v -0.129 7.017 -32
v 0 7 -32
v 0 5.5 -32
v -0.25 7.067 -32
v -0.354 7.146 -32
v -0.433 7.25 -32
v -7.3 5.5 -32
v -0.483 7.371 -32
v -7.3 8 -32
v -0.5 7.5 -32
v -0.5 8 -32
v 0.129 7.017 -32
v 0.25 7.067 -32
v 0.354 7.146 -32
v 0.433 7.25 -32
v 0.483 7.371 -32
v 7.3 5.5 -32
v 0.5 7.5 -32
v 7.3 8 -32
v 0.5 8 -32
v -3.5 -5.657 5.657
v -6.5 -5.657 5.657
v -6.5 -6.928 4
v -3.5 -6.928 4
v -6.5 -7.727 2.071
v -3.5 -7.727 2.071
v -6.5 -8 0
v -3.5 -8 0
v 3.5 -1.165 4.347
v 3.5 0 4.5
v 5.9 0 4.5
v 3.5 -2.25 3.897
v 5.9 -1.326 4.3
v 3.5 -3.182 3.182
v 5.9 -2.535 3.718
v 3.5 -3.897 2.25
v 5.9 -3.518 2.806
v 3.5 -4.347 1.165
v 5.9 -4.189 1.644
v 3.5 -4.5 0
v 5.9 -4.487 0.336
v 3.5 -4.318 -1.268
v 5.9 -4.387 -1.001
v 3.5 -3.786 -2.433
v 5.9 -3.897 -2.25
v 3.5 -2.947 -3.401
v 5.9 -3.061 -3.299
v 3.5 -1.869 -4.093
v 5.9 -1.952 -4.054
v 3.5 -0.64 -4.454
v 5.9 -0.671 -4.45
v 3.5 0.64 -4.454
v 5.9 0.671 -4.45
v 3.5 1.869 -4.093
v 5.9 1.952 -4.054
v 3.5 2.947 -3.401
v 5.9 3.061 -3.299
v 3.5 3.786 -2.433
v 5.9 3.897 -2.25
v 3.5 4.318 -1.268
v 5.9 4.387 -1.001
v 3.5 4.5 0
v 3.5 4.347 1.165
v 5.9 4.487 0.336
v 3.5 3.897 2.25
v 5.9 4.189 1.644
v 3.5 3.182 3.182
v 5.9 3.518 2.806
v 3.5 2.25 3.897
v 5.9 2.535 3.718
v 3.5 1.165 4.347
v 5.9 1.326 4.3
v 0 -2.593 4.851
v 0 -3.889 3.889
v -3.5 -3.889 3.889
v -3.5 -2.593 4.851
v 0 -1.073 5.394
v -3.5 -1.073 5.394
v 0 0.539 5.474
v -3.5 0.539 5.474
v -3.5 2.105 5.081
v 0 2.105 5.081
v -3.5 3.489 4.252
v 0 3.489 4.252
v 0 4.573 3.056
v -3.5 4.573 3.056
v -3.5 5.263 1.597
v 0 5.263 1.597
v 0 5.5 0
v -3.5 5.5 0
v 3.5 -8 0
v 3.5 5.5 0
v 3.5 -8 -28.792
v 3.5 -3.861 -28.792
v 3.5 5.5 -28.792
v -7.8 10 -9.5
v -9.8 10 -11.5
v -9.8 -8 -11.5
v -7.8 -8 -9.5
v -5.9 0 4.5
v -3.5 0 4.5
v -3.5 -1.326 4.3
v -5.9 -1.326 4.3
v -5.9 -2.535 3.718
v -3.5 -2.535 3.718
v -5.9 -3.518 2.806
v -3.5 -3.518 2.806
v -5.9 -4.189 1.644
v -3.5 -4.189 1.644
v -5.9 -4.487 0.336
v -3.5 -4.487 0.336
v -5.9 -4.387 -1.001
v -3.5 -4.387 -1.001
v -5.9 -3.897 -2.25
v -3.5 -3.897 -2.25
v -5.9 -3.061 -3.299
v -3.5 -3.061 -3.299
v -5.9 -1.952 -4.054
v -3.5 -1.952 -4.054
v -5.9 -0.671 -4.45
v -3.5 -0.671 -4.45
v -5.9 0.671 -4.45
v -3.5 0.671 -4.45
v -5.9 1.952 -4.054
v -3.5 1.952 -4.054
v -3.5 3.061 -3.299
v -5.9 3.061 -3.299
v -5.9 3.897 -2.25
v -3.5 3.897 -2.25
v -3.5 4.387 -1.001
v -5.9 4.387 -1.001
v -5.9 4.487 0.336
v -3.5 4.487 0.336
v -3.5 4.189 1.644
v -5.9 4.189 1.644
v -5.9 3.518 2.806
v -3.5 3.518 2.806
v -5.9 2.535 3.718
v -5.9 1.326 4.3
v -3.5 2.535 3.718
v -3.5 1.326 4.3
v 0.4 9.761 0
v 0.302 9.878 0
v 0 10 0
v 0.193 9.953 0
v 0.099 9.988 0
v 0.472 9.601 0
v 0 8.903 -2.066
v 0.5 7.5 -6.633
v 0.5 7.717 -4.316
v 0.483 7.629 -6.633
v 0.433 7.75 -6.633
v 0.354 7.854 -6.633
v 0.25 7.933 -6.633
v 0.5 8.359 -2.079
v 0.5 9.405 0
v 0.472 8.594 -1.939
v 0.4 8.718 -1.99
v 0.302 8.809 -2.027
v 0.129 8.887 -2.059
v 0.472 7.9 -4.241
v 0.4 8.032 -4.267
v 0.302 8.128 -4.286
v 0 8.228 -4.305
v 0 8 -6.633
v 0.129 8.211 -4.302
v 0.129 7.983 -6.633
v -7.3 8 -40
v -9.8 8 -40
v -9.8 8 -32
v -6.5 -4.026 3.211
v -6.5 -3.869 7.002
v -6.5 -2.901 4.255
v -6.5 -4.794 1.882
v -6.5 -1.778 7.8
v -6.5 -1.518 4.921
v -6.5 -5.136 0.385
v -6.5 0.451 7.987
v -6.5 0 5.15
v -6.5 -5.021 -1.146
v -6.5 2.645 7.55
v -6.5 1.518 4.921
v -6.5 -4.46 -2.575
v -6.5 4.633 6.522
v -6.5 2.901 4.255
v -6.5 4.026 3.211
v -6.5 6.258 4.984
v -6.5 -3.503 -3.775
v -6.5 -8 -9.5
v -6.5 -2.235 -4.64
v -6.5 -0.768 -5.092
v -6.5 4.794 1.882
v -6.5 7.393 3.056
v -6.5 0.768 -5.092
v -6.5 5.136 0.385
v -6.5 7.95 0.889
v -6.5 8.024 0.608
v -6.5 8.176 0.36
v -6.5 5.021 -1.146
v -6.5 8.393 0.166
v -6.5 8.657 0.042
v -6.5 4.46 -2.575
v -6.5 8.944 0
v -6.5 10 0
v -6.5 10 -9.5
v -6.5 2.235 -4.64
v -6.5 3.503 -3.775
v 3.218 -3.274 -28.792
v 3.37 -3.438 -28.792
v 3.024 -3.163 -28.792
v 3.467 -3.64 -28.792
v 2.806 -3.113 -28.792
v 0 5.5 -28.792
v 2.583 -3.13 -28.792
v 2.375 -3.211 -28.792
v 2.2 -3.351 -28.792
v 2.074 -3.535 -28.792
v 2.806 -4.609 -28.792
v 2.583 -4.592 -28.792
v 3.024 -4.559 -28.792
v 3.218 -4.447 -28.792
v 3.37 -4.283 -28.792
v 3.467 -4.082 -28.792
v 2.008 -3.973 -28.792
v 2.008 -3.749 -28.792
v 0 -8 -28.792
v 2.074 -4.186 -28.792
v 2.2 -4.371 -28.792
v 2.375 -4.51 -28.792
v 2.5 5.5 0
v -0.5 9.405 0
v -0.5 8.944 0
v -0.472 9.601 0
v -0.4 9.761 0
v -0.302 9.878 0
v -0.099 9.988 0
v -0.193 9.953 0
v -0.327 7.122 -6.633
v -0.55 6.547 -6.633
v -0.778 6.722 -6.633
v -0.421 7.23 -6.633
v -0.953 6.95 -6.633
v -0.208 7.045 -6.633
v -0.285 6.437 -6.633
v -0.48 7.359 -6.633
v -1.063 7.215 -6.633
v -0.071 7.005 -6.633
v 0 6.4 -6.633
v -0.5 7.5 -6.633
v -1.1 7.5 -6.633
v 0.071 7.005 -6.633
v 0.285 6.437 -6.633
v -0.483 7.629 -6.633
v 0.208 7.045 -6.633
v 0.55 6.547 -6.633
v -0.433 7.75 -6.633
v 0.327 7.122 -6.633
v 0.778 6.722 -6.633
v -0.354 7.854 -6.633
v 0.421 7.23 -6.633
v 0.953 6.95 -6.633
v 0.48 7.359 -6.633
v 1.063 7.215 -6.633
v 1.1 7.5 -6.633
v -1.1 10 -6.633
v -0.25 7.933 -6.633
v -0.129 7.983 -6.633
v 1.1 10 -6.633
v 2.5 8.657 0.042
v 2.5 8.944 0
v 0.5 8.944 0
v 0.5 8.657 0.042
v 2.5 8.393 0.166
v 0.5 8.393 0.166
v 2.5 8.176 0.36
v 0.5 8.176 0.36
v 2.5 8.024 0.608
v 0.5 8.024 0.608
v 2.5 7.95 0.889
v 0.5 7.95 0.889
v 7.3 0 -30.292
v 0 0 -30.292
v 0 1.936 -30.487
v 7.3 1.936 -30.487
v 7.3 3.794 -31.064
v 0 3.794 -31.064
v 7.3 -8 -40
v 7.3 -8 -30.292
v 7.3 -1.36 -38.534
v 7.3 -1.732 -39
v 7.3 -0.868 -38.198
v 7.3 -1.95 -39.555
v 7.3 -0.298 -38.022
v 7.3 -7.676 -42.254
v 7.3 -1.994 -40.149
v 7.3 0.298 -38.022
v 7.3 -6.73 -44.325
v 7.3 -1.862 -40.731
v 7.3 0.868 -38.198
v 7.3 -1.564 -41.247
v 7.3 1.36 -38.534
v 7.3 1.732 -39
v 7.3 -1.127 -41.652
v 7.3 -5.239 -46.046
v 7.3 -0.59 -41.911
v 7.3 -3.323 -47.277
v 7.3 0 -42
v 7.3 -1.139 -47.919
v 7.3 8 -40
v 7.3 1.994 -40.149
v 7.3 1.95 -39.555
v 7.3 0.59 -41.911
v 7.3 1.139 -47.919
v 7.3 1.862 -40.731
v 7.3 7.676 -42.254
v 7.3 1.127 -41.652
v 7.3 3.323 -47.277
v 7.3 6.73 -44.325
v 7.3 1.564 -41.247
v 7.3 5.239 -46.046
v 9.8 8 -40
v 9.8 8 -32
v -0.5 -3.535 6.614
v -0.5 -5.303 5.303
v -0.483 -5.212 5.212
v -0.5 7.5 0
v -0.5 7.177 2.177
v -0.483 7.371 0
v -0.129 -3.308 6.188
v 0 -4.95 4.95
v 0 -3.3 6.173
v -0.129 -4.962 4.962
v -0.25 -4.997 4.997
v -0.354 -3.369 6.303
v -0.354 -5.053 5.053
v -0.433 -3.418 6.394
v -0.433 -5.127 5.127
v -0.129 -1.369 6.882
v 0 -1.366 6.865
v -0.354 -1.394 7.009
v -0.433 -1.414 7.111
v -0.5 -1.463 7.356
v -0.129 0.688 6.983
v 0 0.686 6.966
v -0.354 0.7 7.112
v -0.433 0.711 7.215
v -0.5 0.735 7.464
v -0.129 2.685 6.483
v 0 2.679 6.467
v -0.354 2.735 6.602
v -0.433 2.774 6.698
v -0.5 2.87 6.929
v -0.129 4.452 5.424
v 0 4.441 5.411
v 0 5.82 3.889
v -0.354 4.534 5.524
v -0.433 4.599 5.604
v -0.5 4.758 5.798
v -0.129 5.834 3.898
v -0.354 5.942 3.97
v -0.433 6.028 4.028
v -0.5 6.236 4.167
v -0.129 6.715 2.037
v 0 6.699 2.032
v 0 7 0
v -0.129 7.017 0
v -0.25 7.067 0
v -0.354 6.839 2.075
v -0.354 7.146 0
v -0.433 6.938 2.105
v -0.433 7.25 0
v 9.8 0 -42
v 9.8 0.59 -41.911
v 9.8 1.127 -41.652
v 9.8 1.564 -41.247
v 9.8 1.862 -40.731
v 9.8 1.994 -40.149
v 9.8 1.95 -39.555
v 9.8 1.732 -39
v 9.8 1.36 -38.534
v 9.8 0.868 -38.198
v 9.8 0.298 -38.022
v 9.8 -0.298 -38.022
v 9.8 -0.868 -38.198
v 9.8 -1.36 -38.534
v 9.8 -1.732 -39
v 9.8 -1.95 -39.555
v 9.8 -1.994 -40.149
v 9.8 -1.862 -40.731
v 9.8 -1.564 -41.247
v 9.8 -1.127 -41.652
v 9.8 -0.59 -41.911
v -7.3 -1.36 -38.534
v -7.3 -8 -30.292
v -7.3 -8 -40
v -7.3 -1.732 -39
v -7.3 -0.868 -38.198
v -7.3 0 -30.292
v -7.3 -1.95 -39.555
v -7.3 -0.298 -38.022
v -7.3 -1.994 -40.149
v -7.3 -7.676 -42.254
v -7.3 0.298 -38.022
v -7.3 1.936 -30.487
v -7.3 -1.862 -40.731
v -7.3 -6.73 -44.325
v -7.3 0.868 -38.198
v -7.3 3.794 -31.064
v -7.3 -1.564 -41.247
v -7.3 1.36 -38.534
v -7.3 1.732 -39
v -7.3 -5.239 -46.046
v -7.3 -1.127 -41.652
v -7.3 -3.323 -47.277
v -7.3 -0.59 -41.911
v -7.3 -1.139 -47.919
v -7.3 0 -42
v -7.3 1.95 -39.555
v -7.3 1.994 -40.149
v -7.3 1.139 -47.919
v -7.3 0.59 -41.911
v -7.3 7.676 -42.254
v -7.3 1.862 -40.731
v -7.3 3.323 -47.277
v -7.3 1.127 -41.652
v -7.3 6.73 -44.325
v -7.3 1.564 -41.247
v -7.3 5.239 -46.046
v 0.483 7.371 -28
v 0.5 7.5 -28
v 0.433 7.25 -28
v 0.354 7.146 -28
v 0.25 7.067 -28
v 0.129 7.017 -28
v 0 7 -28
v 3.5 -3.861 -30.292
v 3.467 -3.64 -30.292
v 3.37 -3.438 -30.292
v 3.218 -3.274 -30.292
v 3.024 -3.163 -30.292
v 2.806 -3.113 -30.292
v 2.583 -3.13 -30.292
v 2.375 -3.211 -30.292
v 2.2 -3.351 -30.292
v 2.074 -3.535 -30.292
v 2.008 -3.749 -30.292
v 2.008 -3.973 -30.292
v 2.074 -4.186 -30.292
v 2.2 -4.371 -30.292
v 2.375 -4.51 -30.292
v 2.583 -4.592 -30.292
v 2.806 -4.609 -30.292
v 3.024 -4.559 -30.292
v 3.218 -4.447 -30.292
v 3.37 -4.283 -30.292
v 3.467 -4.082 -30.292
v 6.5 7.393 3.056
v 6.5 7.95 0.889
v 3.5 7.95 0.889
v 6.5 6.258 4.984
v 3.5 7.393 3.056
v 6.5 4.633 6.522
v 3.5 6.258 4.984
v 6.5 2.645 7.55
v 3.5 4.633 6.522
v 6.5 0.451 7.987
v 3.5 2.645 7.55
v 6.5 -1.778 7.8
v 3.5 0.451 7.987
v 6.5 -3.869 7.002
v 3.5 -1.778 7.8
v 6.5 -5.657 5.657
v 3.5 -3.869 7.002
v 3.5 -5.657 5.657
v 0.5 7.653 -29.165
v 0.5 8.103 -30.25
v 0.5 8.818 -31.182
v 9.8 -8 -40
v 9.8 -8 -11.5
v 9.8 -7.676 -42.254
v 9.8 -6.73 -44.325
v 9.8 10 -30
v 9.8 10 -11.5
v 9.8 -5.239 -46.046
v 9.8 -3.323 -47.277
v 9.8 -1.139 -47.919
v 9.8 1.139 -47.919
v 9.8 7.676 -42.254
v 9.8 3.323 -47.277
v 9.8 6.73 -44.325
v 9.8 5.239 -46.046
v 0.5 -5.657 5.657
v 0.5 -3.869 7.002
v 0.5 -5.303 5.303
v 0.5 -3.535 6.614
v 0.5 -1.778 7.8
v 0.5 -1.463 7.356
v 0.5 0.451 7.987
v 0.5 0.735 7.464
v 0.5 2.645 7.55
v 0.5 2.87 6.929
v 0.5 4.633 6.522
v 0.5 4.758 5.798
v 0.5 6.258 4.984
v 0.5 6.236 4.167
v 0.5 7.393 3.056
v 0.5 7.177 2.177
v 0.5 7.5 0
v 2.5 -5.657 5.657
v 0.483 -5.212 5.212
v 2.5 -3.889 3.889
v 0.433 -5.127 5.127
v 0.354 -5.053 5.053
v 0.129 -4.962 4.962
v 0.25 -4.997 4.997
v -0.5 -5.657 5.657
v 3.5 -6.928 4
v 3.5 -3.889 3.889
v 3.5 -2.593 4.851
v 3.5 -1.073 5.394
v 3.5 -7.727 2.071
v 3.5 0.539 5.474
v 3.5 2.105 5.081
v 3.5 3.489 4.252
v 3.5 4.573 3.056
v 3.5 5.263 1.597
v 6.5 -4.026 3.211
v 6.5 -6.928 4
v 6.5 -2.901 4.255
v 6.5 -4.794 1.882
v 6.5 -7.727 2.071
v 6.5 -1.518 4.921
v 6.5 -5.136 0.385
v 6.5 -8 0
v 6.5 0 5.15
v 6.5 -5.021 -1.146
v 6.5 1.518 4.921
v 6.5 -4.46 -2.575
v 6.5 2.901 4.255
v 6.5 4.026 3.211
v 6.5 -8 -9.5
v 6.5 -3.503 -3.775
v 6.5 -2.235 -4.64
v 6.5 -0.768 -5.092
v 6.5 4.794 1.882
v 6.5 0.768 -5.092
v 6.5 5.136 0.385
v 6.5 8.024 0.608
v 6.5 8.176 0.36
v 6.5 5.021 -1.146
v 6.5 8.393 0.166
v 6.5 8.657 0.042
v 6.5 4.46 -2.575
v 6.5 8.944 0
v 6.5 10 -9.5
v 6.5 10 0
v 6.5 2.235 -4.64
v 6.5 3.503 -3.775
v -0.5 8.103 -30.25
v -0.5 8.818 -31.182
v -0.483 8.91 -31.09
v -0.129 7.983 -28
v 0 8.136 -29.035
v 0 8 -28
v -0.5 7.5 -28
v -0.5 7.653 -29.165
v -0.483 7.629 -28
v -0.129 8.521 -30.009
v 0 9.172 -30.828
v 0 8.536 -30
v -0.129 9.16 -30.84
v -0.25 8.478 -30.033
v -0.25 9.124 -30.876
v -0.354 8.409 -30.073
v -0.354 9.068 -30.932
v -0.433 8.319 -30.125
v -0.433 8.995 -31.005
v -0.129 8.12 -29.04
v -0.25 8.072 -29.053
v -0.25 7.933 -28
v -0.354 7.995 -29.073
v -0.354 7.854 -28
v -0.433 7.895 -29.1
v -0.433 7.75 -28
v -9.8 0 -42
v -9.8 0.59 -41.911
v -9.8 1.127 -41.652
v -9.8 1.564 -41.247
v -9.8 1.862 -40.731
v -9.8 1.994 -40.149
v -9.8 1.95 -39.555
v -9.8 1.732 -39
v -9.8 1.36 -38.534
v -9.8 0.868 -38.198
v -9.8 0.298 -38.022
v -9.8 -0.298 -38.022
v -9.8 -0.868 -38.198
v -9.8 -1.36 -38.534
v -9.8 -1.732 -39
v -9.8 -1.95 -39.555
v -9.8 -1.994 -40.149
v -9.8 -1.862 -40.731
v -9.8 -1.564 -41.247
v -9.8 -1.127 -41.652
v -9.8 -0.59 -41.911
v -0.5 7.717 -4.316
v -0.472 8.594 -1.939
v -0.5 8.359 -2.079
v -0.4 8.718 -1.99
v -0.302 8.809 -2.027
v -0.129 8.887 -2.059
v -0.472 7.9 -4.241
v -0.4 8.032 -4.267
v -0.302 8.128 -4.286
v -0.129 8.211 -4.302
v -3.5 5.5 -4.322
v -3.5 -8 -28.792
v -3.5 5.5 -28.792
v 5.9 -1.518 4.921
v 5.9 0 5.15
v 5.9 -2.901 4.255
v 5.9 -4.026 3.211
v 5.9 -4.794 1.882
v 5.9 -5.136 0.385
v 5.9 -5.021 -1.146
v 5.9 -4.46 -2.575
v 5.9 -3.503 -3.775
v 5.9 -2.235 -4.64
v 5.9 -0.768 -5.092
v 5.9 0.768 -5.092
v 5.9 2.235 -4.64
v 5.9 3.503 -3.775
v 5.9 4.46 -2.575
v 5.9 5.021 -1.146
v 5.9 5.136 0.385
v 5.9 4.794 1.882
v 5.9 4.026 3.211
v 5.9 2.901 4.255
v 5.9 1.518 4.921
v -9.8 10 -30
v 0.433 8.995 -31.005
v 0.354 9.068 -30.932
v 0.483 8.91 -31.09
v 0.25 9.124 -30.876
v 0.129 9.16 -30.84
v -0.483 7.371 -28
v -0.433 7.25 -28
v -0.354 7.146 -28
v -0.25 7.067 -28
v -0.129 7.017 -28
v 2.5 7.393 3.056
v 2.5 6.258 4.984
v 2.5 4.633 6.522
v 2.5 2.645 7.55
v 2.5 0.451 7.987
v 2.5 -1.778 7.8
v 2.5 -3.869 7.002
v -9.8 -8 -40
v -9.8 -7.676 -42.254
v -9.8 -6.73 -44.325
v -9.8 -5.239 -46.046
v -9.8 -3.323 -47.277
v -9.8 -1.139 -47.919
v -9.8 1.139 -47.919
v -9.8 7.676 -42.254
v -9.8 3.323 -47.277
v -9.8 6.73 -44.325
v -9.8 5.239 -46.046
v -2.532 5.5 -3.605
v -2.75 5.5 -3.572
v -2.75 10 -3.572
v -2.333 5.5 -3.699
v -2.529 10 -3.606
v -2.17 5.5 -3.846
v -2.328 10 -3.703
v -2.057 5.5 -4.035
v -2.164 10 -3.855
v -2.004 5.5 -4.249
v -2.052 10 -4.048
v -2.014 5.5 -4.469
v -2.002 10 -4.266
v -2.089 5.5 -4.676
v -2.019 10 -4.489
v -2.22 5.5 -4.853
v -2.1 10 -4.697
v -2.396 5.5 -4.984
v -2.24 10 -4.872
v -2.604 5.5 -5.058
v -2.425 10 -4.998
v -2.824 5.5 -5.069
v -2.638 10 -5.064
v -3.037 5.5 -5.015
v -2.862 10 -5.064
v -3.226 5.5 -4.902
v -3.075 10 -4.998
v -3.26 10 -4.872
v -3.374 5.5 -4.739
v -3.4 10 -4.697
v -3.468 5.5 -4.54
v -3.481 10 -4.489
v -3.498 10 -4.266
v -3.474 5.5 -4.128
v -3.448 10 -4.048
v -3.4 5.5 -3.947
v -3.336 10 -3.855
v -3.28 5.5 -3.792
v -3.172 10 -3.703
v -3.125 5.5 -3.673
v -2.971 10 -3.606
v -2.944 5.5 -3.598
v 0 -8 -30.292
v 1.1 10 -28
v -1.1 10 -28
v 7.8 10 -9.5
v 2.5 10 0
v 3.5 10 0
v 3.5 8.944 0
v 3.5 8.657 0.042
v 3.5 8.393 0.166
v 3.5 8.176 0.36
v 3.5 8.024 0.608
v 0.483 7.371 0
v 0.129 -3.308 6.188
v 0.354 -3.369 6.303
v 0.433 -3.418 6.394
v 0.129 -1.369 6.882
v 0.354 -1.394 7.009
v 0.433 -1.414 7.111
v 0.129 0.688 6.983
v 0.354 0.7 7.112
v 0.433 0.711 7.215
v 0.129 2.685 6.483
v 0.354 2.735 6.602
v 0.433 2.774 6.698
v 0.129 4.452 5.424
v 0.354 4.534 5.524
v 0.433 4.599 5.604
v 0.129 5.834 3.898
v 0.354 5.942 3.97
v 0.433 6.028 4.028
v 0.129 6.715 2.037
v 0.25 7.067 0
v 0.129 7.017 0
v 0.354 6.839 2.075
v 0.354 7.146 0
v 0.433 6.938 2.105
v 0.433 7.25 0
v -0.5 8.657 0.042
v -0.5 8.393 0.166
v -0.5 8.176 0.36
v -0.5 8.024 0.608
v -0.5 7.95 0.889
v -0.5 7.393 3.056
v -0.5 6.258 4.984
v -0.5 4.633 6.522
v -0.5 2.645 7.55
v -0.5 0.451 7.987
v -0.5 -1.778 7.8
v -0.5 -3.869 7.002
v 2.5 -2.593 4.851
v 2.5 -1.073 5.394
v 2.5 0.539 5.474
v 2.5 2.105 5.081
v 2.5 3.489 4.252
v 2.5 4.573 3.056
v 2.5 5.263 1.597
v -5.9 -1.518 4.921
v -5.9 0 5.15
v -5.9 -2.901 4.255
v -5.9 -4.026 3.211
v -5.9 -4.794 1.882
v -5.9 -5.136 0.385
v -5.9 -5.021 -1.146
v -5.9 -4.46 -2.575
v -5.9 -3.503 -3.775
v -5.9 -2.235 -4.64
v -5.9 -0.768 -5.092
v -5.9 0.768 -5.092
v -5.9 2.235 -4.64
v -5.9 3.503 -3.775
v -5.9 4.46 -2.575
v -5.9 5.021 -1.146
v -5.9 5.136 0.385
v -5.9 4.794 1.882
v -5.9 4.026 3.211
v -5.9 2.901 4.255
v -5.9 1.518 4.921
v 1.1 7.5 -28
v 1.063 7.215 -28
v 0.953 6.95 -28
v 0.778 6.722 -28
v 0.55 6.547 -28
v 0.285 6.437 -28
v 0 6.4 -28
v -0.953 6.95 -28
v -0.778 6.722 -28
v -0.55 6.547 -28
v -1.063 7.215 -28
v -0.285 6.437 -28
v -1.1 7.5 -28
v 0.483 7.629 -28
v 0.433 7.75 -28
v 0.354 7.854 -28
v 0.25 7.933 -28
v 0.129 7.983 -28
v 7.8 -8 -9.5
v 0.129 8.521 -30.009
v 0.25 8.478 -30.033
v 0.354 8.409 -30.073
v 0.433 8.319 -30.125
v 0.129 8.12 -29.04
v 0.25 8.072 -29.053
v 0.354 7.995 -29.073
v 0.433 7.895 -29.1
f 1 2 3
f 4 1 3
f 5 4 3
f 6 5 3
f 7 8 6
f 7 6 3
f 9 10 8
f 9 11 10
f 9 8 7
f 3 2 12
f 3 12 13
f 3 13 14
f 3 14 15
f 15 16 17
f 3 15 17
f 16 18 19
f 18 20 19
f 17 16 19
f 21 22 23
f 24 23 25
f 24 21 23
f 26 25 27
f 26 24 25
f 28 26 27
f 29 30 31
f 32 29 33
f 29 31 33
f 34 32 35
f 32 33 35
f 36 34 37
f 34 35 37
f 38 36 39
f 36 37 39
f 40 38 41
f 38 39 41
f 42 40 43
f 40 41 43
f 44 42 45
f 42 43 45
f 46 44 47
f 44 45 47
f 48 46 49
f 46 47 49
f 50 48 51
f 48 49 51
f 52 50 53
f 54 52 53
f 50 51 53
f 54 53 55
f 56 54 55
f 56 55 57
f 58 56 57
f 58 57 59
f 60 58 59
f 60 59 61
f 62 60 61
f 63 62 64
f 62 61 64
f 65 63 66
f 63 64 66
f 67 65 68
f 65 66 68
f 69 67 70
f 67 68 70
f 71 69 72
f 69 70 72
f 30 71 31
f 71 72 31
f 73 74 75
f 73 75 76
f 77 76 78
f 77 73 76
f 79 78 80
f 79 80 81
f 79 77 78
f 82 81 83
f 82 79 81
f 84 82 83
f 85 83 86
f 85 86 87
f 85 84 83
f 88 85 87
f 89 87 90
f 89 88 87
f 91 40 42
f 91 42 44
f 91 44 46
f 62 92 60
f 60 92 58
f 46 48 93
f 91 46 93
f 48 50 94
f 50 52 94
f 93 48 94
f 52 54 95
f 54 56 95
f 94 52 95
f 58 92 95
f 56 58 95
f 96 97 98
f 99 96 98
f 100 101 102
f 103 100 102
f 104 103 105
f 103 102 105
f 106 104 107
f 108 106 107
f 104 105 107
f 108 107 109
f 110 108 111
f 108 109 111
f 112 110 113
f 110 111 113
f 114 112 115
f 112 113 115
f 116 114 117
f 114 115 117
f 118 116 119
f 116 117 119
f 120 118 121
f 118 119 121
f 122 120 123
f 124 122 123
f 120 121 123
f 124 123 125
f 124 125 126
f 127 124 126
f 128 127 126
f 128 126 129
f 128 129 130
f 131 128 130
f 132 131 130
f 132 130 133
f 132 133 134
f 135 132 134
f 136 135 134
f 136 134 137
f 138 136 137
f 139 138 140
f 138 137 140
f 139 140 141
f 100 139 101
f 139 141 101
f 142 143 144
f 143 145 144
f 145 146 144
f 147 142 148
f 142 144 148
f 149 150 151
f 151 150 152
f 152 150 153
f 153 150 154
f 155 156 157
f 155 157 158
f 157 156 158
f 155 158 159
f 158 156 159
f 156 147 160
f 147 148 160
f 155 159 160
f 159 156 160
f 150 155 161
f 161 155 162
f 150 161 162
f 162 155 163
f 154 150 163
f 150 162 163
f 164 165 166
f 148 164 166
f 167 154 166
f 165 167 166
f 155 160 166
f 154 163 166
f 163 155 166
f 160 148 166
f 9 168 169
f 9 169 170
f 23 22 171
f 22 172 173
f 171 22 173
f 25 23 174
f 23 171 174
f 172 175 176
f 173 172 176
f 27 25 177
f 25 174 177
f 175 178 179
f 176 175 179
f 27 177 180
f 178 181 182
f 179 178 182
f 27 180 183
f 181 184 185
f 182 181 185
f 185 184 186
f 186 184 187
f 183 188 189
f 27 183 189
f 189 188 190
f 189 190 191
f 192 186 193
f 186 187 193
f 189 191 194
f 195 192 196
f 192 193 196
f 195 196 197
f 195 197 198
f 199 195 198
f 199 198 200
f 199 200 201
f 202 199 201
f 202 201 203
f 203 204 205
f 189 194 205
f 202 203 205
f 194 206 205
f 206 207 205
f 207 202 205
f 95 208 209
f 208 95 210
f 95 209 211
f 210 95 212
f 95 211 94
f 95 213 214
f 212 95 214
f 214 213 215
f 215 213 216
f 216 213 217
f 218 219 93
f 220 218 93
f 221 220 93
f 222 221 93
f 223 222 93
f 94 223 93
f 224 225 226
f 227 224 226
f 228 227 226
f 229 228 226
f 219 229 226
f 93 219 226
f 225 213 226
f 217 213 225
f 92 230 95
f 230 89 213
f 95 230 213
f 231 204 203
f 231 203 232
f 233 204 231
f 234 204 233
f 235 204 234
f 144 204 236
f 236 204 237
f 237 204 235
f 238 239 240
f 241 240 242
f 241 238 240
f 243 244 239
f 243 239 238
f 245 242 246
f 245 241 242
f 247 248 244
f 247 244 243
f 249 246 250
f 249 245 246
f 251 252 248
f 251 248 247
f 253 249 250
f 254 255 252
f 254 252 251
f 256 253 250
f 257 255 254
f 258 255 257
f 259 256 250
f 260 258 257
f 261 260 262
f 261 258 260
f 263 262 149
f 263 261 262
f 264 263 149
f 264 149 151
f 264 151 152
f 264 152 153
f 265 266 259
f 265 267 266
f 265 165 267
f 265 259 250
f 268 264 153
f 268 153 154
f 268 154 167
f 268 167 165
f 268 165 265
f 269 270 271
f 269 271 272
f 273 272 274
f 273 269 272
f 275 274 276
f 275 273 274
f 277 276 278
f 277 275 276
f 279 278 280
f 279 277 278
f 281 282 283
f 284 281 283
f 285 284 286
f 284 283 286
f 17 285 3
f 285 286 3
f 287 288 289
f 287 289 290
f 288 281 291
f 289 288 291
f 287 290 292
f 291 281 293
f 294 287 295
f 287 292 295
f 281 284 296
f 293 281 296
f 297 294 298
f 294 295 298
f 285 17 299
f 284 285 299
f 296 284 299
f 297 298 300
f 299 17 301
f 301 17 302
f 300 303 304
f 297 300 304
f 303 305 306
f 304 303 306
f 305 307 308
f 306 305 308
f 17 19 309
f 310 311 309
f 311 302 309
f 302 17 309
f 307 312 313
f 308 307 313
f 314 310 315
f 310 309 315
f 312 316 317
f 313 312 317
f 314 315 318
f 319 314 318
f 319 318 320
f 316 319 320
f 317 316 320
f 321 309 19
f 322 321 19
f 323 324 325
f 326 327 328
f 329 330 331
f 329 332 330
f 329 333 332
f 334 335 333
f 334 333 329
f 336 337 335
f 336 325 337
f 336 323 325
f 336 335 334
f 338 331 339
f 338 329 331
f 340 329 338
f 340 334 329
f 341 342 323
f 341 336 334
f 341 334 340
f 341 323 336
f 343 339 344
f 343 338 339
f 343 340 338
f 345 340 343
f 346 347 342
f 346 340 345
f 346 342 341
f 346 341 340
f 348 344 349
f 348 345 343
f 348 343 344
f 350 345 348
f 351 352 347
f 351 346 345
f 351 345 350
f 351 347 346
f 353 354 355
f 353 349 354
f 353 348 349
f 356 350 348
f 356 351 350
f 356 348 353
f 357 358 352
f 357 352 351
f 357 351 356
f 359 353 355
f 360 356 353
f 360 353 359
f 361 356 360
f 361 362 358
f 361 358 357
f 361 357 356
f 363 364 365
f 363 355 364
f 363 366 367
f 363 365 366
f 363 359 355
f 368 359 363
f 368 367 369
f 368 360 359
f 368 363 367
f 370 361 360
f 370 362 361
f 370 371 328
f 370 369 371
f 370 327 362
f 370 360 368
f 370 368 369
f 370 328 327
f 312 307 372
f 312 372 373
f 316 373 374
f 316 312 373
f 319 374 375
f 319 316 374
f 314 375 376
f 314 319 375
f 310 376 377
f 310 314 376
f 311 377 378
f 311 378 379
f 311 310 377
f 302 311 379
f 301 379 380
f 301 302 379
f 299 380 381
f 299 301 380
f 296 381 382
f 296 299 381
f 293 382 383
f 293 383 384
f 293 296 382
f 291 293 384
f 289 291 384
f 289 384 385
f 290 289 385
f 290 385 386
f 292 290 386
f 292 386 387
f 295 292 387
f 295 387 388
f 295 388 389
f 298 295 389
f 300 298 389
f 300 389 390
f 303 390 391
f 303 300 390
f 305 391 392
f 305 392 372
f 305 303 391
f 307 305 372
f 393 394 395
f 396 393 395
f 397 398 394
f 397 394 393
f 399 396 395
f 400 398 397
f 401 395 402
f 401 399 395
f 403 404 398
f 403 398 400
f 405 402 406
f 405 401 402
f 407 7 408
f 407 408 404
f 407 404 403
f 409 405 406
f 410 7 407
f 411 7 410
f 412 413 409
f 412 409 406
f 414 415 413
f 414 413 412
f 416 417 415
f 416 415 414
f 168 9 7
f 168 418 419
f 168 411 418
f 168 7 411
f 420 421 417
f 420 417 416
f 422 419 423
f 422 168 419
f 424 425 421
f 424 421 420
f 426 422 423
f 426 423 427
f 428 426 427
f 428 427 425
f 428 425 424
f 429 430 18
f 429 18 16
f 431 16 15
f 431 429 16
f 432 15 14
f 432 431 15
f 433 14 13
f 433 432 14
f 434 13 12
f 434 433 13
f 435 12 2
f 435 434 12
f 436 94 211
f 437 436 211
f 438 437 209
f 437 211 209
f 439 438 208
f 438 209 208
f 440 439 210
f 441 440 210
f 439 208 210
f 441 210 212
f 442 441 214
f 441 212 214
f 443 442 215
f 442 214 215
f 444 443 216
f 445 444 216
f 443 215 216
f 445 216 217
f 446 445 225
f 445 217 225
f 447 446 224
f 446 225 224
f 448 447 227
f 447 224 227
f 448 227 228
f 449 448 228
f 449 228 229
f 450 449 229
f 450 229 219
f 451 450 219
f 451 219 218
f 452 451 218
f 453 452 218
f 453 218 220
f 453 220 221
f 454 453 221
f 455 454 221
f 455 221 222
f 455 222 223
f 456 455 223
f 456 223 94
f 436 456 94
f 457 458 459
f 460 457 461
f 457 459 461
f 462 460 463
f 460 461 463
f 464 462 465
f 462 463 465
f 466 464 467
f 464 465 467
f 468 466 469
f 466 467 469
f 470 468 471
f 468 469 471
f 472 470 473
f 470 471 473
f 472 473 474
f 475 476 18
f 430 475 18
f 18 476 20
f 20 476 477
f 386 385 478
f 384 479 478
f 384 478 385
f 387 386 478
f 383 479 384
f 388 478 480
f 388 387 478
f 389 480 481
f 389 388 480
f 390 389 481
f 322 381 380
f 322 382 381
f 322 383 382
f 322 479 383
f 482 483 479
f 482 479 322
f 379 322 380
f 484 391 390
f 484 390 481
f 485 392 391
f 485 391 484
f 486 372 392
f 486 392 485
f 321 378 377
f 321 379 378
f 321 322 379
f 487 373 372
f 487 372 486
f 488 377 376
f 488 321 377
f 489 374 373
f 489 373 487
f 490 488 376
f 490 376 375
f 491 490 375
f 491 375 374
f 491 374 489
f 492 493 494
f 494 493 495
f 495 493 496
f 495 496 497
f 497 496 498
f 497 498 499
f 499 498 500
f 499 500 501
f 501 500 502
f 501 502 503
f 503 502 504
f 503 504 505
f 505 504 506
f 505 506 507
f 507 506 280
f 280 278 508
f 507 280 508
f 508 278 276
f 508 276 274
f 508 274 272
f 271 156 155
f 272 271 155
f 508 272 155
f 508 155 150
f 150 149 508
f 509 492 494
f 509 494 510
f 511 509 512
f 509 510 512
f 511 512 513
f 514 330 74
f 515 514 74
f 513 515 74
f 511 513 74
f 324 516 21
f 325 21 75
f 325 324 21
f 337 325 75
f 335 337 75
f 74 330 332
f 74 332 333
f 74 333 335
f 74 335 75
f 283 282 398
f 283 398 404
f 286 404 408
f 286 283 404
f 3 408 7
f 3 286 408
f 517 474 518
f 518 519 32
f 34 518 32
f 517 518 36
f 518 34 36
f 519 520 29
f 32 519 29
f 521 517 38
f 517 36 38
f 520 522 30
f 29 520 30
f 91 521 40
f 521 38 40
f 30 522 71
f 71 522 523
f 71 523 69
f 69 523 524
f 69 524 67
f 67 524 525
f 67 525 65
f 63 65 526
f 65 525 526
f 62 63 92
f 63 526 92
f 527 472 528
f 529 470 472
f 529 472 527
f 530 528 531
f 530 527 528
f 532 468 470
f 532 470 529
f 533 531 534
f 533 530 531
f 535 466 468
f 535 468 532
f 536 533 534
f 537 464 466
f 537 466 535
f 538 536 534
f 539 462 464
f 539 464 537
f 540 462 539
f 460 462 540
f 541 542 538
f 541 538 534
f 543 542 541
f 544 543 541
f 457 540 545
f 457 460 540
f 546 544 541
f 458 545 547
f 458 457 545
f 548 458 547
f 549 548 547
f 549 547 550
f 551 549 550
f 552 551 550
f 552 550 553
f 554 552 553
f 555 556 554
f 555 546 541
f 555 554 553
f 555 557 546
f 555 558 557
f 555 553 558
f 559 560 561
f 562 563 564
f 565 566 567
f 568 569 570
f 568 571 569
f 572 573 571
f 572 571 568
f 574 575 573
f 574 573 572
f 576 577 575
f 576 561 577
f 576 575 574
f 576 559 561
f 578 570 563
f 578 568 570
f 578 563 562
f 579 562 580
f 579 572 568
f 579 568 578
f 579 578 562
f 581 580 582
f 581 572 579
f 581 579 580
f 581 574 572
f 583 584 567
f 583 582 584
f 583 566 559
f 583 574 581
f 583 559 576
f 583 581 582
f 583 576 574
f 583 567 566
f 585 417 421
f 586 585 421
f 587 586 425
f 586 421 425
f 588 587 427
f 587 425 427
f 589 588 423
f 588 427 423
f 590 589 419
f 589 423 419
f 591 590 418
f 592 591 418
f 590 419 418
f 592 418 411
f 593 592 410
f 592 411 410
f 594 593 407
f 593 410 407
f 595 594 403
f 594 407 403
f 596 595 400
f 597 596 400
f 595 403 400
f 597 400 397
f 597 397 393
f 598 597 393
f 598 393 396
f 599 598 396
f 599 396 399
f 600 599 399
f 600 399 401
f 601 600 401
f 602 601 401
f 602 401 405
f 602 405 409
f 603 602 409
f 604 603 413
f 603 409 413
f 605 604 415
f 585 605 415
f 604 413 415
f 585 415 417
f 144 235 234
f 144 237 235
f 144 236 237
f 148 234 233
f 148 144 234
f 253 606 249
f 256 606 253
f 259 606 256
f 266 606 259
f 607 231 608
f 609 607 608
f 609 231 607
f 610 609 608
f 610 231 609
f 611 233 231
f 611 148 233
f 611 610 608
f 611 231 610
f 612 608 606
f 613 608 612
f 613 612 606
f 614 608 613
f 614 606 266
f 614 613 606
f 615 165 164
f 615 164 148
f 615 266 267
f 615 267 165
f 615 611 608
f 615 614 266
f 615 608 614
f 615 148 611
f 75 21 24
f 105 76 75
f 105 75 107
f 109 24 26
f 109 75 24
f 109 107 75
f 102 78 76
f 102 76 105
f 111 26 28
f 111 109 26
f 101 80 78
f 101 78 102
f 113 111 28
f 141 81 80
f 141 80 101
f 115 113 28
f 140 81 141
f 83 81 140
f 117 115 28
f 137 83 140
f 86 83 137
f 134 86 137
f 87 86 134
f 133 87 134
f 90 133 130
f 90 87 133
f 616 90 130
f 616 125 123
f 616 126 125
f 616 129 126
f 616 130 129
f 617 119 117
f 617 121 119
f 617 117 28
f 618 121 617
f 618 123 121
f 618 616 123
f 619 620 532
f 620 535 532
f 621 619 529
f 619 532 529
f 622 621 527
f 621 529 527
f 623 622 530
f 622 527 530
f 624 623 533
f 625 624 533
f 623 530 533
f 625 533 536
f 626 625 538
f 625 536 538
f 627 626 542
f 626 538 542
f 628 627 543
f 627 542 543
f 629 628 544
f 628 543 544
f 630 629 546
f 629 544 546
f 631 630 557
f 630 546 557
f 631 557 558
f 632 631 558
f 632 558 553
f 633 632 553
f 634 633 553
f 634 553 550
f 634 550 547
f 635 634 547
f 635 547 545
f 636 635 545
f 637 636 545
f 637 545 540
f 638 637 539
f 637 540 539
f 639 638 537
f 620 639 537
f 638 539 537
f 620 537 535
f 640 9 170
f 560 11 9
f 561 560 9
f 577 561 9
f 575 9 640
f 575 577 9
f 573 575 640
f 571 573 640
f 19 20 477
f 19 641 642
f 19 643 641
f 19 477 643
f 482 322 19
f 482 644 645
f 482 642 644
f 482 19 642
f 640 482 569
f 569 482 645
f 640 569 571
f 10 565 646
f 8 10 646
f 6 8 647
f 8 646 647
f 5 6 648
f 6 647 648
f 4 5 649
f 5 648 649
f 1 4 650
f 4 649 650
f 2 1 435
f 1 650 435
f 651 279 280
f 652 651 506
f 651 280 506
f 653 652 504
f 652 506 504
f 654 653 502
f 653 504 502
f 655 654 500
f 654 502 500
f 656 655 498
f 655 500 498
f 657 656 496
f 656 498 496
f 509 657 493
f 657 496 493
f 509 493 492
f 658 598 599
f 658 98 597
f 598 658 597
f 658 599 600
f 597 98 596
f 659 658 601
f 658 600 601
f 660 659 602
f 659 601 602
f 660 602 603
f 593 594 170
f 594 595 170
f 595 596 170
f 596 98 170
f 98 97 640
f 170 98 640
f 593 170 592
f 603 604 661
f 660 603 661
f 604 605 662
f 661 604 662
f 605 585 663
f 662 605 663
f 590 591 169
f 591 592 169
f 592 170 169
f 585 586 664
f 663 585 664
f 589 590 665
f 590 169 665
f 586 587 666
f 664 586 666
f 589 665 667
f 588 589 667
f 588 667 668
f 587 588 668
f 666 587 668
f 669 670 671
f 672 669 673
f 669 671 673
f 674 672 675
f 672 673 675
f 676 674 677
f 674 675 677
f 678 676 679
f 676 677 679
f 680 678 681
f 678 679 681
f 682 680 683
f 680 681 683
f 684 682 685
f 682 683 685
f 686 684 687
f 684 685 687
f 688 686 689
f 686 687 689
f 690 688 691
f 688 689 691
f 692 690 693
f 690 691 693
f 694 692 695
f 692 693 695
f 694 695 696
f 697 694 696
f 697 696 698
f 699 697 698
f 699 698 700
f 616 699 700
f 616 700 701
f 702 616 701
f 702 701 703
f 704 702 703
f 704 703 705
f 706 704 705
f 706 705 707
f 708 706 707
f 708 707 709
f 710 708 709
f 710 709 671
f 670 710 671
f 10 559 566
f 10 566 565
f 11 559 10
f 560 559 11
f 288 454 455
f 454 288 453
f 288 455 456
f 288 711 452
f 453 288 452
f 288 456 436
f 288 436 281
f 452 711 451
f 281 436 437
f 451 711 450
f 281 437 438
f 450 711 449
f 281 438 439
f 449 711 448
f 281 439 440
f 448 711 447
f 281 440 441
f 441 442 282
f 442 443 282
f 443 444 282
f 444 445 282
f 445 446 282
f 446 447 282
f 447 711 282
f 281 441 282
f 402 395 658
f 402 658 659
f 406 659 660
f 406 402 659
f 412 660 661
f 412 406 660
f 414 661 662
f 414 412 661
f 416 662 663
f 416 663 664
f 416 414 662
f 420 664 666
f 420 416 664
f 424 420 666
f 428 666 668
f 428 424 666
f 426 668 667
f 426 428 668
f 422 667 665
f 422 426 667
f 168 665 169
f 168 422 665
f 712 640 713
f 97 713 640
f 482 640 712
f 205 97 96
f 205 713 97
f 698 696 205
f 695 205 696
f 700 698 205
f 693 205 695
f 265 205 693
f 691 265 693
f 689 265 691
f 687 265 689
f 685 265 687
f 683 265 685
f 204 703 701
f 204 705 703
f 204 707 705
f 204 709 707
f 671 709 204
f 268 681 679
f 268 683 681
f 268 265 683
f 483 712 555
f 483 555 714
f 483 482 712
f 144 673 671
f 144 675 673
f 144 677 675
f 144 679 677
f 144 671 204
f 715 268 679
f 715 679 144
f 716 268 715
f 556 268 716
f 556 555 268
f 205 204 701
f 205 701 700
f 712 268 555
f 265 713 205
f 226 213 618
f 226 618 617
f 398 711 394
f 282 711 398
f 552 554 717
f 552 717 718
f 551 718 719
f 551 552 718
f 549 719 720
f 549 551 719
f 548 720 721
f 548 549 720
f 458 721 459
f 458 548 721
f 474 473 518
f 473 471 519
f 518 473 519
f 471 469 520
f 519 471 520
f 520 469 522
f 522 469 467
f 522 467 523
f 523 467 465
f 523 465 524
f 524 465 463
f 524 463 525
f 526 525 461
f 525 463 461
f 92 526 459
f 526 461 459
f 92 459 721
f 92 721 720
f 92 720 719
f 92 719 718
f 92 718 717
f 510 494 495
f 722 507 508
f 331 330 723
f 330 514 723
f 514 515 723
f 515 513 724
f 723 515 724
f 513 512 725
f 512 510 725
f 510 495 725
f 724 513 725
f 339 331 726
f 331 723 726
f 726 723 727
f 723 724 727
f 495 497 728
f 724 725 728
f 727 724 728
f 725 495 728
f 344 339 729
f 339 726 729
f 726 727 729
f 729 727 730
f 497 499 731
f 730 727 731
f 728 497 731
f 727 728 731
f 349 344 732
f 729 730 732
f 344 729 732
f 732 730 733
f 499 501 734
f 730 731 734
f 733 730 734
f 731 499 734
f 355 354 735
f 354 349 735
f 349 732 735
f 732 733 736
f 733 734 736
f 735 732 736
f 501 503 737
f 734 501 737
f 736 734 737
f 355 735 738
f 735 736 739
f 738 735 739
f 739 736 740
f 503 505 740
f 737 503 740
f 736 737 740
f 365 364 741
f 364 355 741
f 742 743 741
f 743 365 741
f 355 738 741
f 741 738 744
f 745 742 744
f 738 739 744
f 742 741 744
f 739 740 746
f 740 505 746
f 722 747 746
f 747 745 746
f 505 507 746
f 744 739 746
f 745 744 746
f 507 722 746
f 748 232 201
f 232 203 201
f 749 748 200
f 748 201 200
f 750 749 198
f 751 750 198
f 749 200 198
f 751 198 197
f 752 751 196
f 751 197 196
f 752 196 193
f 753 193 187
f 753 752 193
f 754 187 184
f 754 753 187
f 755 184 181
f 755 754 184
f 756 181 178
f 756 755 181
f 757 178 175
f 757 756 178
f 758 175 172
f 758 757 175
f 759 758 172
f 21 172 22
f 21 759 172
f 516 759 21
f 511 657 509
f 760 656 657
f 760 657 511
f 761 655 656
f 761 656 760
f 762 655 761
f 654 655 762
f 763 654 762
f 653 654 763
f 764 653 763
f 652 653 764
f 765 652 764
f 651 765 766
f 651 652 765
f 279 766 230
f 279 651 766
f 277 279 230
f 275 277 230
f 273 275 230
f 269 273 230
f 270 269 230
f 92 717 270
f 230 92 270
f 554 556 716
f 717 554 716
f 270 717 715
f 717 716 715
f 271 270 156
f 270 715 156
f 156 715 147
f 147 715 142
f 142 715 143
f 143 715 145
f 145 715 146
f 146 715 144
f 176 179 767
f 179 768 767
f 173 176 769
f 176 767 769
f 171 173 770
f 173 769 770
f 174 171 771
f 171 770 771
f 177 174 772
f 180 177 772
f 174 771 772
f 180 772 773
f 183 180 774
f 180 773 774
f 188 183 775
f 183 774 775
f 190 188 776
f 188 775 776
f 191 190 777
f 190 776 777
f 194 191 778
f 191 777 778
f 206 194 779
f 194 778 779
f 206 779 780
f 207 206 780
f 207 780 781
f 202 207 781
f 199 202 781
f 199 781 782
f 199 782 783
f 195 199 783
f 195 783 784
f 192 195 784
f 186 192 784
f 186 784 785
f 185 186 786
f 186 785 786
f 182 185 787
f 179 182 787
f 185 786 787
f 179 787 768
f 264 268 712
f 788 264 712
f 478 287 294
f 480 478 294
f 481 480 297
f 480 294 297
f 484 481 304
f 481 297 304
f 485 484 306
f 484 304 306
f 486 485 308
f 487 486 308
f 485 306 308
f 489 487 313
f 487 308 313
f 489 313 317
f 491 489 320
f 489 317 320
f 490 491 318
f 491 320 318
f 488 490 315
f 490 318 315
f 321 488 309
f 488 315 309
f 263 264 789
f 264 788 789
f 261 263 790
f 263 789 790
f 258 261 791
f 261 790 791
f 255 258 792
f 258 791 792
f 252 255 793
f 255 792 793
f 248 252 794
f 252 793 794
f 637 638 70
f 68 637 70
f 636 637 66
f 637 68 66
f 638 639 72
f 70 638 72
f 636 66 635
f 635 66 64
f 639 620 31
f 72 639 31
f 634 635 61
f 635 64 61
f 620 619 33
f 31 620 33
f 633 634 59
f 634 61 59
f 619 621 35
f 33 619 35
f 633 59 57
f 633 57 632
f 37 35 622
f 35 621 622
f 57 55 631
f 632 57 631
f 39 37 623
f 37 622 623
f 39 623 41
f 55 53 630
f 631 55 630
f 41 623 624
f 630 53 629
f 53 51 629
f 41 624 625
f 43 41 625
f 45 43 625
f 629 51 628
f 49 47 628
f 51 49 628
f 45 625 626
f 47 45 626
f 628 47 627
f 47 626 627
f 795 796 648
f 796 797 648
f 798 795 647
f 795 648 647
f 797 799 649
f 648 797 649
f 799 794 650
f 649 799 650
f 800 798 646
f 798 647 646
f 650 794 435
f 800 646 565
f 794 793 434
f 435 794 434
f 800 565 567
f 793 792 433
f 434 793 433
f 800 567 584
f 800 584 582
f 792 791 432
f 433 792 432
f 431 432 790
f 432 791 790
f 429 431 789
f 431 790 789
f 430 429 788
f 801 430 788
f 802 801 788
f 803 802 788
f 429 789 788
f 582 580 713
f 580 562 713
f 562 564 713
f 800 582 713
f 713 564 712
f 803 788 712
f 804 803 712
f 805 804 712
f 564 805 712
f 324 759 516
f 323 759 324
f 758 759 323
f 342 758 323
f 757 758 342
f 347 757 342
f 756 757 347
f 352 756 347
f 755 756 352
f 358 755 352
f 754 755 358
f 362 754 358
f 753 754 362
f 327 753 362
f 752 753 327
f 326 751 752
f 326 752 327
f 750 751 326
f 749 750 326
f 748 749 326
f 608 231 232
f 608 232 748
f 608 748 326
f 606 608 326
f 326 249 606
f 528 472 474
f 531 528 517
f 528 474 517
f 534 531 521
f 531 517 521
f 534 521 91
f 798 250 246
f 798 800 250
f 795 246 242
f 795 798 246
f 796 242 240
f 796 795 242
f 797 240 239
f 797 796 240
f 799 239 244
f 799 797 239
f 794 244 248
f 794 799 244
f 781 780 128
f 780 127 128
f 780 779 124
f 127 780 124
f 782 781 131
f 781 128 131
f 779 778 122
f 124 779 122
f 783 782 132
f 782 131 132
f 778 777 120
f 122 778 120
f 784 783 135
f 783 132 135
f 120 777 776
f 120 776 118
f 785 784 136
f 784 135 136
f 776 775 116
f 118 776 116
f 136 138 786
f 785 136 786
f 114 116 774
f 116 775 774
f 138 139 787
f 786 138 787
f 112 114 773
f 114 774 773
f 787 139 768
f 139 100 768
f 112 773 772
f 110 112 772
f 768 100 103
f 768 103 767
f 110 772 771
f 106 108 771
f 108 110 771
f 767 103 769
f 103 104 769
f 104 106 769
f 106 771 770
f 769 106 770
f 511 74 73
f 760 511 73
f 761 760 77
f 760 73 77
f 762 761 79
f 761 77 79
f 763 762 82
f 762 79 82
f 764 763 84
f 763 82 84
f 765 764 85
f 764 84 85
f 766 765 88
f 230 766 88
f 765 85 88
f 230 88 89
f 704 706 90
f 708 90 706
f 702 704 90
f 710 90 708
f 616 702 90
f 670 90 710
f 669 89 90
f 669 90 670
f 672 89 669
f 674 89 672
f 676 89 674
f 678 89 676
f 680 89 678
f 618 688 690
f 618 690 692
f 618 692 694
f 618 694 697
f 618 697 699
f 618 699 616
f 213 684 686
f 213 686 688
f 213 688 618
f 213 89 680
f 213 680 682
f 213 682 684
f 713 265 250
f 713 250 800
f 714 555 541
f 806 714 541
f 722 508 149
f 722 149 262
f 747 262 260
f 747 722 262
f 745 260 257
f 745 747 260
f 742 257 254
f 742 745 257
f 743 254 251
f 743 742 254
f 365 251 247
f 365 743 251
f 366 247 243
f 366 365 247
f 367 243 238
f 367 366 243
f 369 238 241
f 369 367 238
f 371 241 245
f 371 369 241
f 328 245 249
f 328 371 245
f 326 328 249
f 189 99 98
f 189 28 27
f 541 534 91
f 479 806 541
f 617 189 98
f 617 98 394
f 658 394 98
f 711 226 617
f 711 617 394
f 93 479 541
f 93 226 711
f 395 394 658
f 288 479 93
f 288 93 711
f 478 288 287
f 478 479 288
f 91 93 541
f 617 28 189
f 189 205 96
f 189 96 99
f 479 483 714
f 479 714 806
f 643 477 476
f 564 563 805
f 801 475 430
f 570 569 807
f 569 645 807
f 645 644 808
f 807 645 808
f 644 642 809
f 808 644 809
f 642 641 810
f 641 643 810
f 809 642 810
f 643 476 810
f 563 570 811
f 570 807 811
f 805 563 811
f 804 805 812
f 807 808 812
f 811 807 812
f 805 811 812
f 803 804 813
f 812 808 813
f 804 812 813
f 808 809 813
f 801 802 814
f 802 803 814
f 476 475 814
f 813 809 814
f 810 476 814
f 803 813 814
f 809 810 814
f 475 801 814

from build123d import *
from build123d.topology import SkipClean

# Parameters (mm, degrees)
BOSS_EXTRU_1_START      = 3.5
ESQUISSE1_R             = 2
BOSS_EXTRU_1_DEPTH      = 3
BOSS_EXTRU_2_START      = 6.5
BOSS_EXTRU_2_DEPTH      = 3.3
BOSS_EXTRU_5_START      = 7.3
ESQUISSE1_12_R          = 2
BOSS_EXTRU_5_DEPTH      = 2.5
BOSS_EXTRU_3_DEPTH      = 6.5
BOSS_EXTRU_4_START      = 0.5
BOSS_EXTRU_4_DEPTH      = 6
CONG_4_R                = 12
FILLET1_R               = 0.5
FILLET2_R               = 1
CHAMFER1_SIZE           = 2
ENL_V_START             = 3.5
ESQUISSE2_W             = 8
ESQUISSE2_H             = 18
ENL_V_MAT_EXTRU_1_DEPTH = 1
ENL_V_MAT_EXTRU_3_REACH = 52
ESQUISSE4_R             = 0.75
ESQUISSE5_W             = 21.366750419
ESQUISSE5_H             = 3.6
ENL_V_MAT_EXTRU_4_DEPTH = 1.1
CONG_5_R                = 1.1
ENL_V_MAT_EXTRU_5_REACH = 54.192
ESQUISSE12_R            = 0.75


# Some blends are built 0.0001 mm under size
with BuildPart() as part:
    # Esquisse1 → Boss.-Extru.1 (new body)
    with BuildSketch(Plane(origin=(0, 0, 0), x_dir=(0, 0, -1), z_dir=(1, 0, 0)).offset(BOSS_EXTRU_1_START)):
        with BuildLine():
            Line((30, 10), (0, 10))
            Line((0, 10), (0, 8))
            ThreePointArc((0, 8), (-8, 0), (0, -8))
            Line((0, -8), (30.291756081, -8))
            Line((30.291756081, -8), (30.291756081, 0))
            ThreePointArc((30.291756081, 0), (30.728647581, 2.879587526), (32, 5.5))
            Line((32, 5.5), (32, 8))
            Line((32, 8), (30, 10))
        make_face()
        Circle(ESQUISSE1_R, mode=Mode.SUBTRACT)
    extrude(amount=BOSS_EXTRU_1_DEPTH)

    # Esquisse1<8> → Boss.-Extru.2 (add)
    with BuildSketch(Plane(origin=(0, 0, 0), x_dir=(0, 0, -1), z_dir=(1, 0, 0)).offset(BOSS_EXTRU_2_START)):
        with BuildLine():
            Line((30, 10), (9.5, 10))
            Line((9.5, 10), (9.5, -8))
            Line((9.5, -8), (30.291756081, -8))
            Line((30.291756081, -8), (30.291756081, 0))
            ThreePointArc((30.291756081, 0), (30.728647581, 2.879587526), (32, 5.5))
            Line((32, 5.5), (32, 8))
            Line((32, 8), (30, 10))
        make_face()
    extrude(amount=BOSS_EXTRU_2_DEPTH)

    # Esquisse1<12> → Boss.-Extru.5 (add)
    with BuildSketch(Plane(origin=(0, 0, 0), x_dir=(0, 0, -1), z_dir=(1, 0, 0)).offset(BOSS_EXTRU_5_START)):
        with BuildLine():
            Line((40, 8), (32, 8))
            Line((32, 8), (32, 7))
            Line((32, 7), (32, 5.5))
            ThreePointArc((32, 5.5), (30.728647581, 2.879587526), (30.291756081, 0))
            Line((30.291756081, 0), (30.291756081, -8))
            Line((30.291756081, -8), (40, -8))
            ThreePointArc((40, -8), (48, 0), (40, 8))
        make_face()
        with Locations((40, 0)):
            Circle(ESQUISSE1_12_R, mode=Mode.SUBTRACT)
    extrude(amount=BOSS_EXTRU_5_DEPTH)

    # Esquisse1<9> → Boss.-Extru.3 (add)
    with BuildSketch(Plane(origin=(0, 0, 0), x_dir=(0, 0, -1), z_dir=(1, 0, 0))):
        with BuildLine():
            Line((0, 10), (2, 8))
            Line((2, 8), (28, 8))
            ThreePointArc((28, 8), (29.530733729, 8.30448187), (30.828427125, 9.171572875))
            Line((30.828427125, 9.171572875), (30, 10))
            Line((30, 10), (0, 10))
        make_face()
        with BuildLine():
            Line((0, 5.5), (28.791756081, 5.5))
            Line((28.791756081, 5.5), (28.791756081, -8))
            Line((28.791756081, -8), (30.291756081, -8))
            Line((30.291756081, -8), (30.291756081, 0))
            ThreePointArc((30.291756081, 0), (30.728647581, 2.879587526), (32, 5.5))
            Line((32, 5.5), (32, 7))
            Line((32, 7), (0, 7))
            ThreePointArc((0, 7), (-6.467156728, 2.678784027), (-4.949747468, -4.949747468))
            Line((-4.949747468, -4.949747468), (-3.889087297, -3.889087297))
            ThreePointArc((-3.889087297, -3.889087297), (-5.081337429, 2.104758878), (0, 5.5))
        make_face()
    extrude(amount=BOSS_EXTRU_3_DEPTH)

    # Esquisse1<10> → Boss.-Extru.4 (add)
    with BuildSketch(Plane(origin=(0, 0, 0), x_dir=(0, 0, -1), z_dir=(1, 0, 0)).offset(BOSS_EXTRU_4_START)):
        with BuildLine():
            Line((2, 8), (0, 10))
            Line((0, 10), (0, 8))
            ThreePointArc((0, 8), (-7.39103626, 3.061467459), (-5.656854249, -5.656854249))
            Line((-5.656854249, -5.656854249), (-4.949747468, -4.949747468))
            ThreePointArc((-4.949747468, -4.949747468), (-6.467156728, 2.678784027), (0, 7))
            Line((0, 7), (32, 7))
            Line((32, 7), (32, 8))
            Line((32, 8), (30.828427125, 9.171572875))
            ThreePointArc((30.828427125, 9.171572875), (29.530733729, 8.30448187), (28, 8))
            Line((28, 8), (2, 8))
        make_face()
    extrude(amount=BOSS_EXTRU_4_DEPTH)

    # Congé4
    # the kernel refuses this fillet: 12 mm, written as the material it takes off along each edge
    with BuildSketch(Plane(origin=(-11.583123952, 8, -2), x_dir=(0, 0, -1), z_dir=(1, 0, 0))) as cong_4_piece_1:
        with BuildLine():
            CenterArc((4.633249581, 12), CONG_4_R, 236.442690238, 33.557309762)
            Line((-2, 2), (-2.132664992, 1.8))
            ThreePointArc((-2.132664992, 1.8), (-1.169705627, 0.830294373), (-0.169705627, -0.169705627))
            Line((-0.169705627, -0.169705627), (0, -0.24))
            Line((0, -0.24), (4.633249581, -0.24))
            Line((4.633249581, -0.24), (4.633249581, 0))
        make_face()
    extrude(amount=12.083123952, mode=Mode.SUBTRACT)

    # Fillet1
    # the kernel refuses this fillet: 0.5 mm, written as the material it adds along each edge
    with BuildSketch(Plane(origin=(0.5, 20, -6.633249581), x_dir=(0, -0.7713363788823462, 0.6364276790120538), z_dir=(0, 0.6364276790120538, 0.7713363788823462))) as fillet1_piece_1_section:
        with BuildLine():
            CenterArc((12 + FILLET1_R, -FILLET1_R), FILLET1_R, 90, 90)
            Line((12 + FILLET1_R, 0), (12, 0))
            Line((12, 0), (12, -FILLET1_R))
        make_face()
    fillet1_piece_1 = revolve(axis=Axis((0.5, 20, -6.633249581), (1, 0, 0)), revolution_arc=39.525953359, mode=Mode.PRIVATE)
    fillet1_piece_1 = split(fillet1_piece_1, bisect_by=Plane(origin=(0.358961784, 10, -3.12843374), z_dir=(0, -1, 0)), keep=Keep.TOP, mode=Mode.PRIVATE)
    fillet1_piece_1 = split(fillet1_piece_1, bisect_by=Plane(origin=(0.358961784, 8.375840896, 0), z_dir=(0, 0, -1)), keep=Keep.TOP, mode=Mode.PRIVATE)
    add(fillet1_piece_1)
    with BuildSketch(Plane(origin=(0.5, 8, -28), x_dir=(-1, 0, 0), z_dir=(0, 0, 1))) as fillet1_piece_2:
        with BuildLine():
            CenterArc((FILLET1_R, FILLET1_R), FILLET1_R, 180, 90)
            Line((0, FILLET1_R), (0, 0))
            Line((0, 0), (FILLET1_R, 0))
        make_face()
    extrude(amount=21.366750419)
    with BuildSketch(Plane(origin=(0.5, 7, 0), x_dir=(-1, 0, 0), z_dir=(0, 0, -1))) as fillet1_piece_3:
        with BuildLine():
            CenterArc((FILLET1_R, FILLET1_R), FILLET1_R, 180, 90)
            Line((0, FILLET1_R), (0, 0))
            Line((0, 0), (FILLET1_R, 0))
        make_face()
    extrude(amount=32)
    with BuildSketch(Plane(origin=(0.5, 0, 0), x_dir=(0, -0.7071067811865441, 0.7071067811865509), z_dir=(0, -0.7071067811865509, -0.7071067811865441))) as fillet1_piece_4:
        with BuildLine():
            CenterArc((7 + FILLET1_R, FILLET1_R), FILLET1_R, 180, 90)
            Line((7 + FILLET1_R, 0), (7, 0))
            Line((7, 0), (7, FILLET1_R))
        make_face()
    revolve(axis=Axis((0.5, 0, 0), (-1, 0, 0)), revolution_arc=135)
    with BuildSketch(Plane(origin=(0.5, 12, -28), x_dir=(0, -0.7071067811865426, -0.7071067811865523), z_dir=(0, 0.7071067811865523, -0.7071067811865426))) as fillet1_piece_5:
        with BuildLine():
            CenterArc((4 + FILLET1_R, FILLET1_R), FILLET1_R, 180, 90)
            Line((4 + FILLET1_R, 0), (4, 0))
            Line((4, 0), (4, FILLET1_R))
        make_face()
    revolve(axis=Axis((0.5, 12, -28), (-1, 0, 0)), revolution_arc=45)

    # Fillet2
    fillet2_edges = [part.edges().sort_by_distance(p)[0] for p in [
        (3.5, 8, 0),
    ]]
    fillet(fillet2_edges, radius=FILLET2_R)

    # Chamfer1
    chamfer1_edges = [part.edges().sort_by_distance(p)[0] for p in [
        (9.8, 1, -9.5),
    ]]
    chamfer(chamfer1_edges, length=CHAMFER1_SIZE)

    # Symétrie1: part across plane


with BuildPart() as part_1:
    add(part.part)
    add(part.part.mirror(Plane(origin=(0, 0, 0), x_dir=(0, 0, 1), z_dir=(1, 0, 0))))

    # Esquisse2 → Enlèv. mat.-Extru.1 (cut)
    with SkipClean():  # the faces are left unmerged after this step: merging them gives an invalid solid
        with BuildSketch(Plane(origin=(0, 0, 0), x_dir=(0, 0, -1), z_dir=(1, 0, 0)).offset(ENL_V_START)):
            with Locations((-4, 1)):
                Rectangle(ESQUISSE2_W, ESQUISSE2_H)
        extrude(amount=-ENL_V_MAT_EXTRU_1_DEPTH, mode=Mode.SUBTRACT)

    # Esquisse4 → Enlèv. mat.-Extru.3 (cut, up to next)
    with BuildSketch(Plane.XY, mode=Mode.PRIVATE) as enl_v_mat_extru_3_sk1:
        with Locations((2.75, -3.8608)):
            Circle(ESQUISSE4_R)
    enl_v_mat_extru_3_tool1 = extrude(enl_v_mat_extru_3_sk1.sketch, amount=-ENL_V_MAT_EXTRU_3_REACH, mode=Mode.PRIVATE) & part_1.part
    add(enl_v_mat_extru_3_tool1.solids().sort_by_distance((2.75, -3.8608, 0))[0], mode=Mode.SUBTRACT)

    # Esquisse5 → Enlèv. mat.-Extru.4 (cut, symmetric)
    with SkipClean():  # the faces are left unmerged after this step: merging them gives an invalid solid
        with BuildSketch(Plane(origin=(0, 0, 0), x_dir=(0, 0, -1), z_dir=(1, 0, 0))):
            with Locations((17.316624791, 8.2)):
                Rectangle(ESQUISSE5_W, ESQUISSE5_H)
        extrude(amount=ENL_V_MAT_EXTRU_4_DEPTH, both=True, mode=Mode.SUBTRACT)

    # Congé5
    cong_5_edges = [part_1.edges().sort_by_distance(p)[0] for p in [
        (1.1, 6.4, -17.31662479),
        (-1.1, 6.4, -17.31662479),
    ]]
    fillet(cong_5_edges, radius=CONG_5_R - 0.0001)  # a hair under: the kernel refuses the full size

    # Esquisse10 → Enlèvement de matière-Révolution1 (revolve, cut)
    with BuildSketch(Plane.XY, mode=Mode.PRIVATE) as enl_vement_de_mati_re_r_volution1_sk:
        Polygon((-6.5, 5.15), (-5.9, 5.15), (-5.9, 4.5), (5.9, 4.5), (5.9, 5.15), (6.5, 5.15), (6.5, 2), (-6.5, 2), align=None)
    revolve(enl_vement_de_mati_re_r_volution1_sk.sketch.rotate(Axis((-6.5, 0, 0), (1, 0, 0)), 90), axis=Axis((-6.5, 0, 0), (1, 0, 0)), mode=Mode.SUBTRACT)

    # Esquisse12 → Enlèv. mat.-Extru.5 (cut, up to next)
    with BuildSketch(Plane(origin=(0, 10, 0), x_dir=(1, 0, 0), z_dir=(0, 1, 0)), mode=Mode.PRIVATE) as enl_v_mat_extru_5_sk1:
        with Locations(Location((-2.75, 4.322277882, 0), (0, 0, 270))):
            Circle(ESQUISSE12_R)
    enl_v_mat_extru_5_tool1 = extrude(enl_v_mat_extru_5_sk1.sketch, amount=-ENL_V_MAT_EXTRU_5_REACH, mode=Mode.PRIVATE) & part_1.part
    add(enl_v_mat_extru_5_tool1.solids().sort_by_distance((-2.75, 10, -4.322278))[0], mode=Mode.SUBTRACT)


solid = part_1.part
